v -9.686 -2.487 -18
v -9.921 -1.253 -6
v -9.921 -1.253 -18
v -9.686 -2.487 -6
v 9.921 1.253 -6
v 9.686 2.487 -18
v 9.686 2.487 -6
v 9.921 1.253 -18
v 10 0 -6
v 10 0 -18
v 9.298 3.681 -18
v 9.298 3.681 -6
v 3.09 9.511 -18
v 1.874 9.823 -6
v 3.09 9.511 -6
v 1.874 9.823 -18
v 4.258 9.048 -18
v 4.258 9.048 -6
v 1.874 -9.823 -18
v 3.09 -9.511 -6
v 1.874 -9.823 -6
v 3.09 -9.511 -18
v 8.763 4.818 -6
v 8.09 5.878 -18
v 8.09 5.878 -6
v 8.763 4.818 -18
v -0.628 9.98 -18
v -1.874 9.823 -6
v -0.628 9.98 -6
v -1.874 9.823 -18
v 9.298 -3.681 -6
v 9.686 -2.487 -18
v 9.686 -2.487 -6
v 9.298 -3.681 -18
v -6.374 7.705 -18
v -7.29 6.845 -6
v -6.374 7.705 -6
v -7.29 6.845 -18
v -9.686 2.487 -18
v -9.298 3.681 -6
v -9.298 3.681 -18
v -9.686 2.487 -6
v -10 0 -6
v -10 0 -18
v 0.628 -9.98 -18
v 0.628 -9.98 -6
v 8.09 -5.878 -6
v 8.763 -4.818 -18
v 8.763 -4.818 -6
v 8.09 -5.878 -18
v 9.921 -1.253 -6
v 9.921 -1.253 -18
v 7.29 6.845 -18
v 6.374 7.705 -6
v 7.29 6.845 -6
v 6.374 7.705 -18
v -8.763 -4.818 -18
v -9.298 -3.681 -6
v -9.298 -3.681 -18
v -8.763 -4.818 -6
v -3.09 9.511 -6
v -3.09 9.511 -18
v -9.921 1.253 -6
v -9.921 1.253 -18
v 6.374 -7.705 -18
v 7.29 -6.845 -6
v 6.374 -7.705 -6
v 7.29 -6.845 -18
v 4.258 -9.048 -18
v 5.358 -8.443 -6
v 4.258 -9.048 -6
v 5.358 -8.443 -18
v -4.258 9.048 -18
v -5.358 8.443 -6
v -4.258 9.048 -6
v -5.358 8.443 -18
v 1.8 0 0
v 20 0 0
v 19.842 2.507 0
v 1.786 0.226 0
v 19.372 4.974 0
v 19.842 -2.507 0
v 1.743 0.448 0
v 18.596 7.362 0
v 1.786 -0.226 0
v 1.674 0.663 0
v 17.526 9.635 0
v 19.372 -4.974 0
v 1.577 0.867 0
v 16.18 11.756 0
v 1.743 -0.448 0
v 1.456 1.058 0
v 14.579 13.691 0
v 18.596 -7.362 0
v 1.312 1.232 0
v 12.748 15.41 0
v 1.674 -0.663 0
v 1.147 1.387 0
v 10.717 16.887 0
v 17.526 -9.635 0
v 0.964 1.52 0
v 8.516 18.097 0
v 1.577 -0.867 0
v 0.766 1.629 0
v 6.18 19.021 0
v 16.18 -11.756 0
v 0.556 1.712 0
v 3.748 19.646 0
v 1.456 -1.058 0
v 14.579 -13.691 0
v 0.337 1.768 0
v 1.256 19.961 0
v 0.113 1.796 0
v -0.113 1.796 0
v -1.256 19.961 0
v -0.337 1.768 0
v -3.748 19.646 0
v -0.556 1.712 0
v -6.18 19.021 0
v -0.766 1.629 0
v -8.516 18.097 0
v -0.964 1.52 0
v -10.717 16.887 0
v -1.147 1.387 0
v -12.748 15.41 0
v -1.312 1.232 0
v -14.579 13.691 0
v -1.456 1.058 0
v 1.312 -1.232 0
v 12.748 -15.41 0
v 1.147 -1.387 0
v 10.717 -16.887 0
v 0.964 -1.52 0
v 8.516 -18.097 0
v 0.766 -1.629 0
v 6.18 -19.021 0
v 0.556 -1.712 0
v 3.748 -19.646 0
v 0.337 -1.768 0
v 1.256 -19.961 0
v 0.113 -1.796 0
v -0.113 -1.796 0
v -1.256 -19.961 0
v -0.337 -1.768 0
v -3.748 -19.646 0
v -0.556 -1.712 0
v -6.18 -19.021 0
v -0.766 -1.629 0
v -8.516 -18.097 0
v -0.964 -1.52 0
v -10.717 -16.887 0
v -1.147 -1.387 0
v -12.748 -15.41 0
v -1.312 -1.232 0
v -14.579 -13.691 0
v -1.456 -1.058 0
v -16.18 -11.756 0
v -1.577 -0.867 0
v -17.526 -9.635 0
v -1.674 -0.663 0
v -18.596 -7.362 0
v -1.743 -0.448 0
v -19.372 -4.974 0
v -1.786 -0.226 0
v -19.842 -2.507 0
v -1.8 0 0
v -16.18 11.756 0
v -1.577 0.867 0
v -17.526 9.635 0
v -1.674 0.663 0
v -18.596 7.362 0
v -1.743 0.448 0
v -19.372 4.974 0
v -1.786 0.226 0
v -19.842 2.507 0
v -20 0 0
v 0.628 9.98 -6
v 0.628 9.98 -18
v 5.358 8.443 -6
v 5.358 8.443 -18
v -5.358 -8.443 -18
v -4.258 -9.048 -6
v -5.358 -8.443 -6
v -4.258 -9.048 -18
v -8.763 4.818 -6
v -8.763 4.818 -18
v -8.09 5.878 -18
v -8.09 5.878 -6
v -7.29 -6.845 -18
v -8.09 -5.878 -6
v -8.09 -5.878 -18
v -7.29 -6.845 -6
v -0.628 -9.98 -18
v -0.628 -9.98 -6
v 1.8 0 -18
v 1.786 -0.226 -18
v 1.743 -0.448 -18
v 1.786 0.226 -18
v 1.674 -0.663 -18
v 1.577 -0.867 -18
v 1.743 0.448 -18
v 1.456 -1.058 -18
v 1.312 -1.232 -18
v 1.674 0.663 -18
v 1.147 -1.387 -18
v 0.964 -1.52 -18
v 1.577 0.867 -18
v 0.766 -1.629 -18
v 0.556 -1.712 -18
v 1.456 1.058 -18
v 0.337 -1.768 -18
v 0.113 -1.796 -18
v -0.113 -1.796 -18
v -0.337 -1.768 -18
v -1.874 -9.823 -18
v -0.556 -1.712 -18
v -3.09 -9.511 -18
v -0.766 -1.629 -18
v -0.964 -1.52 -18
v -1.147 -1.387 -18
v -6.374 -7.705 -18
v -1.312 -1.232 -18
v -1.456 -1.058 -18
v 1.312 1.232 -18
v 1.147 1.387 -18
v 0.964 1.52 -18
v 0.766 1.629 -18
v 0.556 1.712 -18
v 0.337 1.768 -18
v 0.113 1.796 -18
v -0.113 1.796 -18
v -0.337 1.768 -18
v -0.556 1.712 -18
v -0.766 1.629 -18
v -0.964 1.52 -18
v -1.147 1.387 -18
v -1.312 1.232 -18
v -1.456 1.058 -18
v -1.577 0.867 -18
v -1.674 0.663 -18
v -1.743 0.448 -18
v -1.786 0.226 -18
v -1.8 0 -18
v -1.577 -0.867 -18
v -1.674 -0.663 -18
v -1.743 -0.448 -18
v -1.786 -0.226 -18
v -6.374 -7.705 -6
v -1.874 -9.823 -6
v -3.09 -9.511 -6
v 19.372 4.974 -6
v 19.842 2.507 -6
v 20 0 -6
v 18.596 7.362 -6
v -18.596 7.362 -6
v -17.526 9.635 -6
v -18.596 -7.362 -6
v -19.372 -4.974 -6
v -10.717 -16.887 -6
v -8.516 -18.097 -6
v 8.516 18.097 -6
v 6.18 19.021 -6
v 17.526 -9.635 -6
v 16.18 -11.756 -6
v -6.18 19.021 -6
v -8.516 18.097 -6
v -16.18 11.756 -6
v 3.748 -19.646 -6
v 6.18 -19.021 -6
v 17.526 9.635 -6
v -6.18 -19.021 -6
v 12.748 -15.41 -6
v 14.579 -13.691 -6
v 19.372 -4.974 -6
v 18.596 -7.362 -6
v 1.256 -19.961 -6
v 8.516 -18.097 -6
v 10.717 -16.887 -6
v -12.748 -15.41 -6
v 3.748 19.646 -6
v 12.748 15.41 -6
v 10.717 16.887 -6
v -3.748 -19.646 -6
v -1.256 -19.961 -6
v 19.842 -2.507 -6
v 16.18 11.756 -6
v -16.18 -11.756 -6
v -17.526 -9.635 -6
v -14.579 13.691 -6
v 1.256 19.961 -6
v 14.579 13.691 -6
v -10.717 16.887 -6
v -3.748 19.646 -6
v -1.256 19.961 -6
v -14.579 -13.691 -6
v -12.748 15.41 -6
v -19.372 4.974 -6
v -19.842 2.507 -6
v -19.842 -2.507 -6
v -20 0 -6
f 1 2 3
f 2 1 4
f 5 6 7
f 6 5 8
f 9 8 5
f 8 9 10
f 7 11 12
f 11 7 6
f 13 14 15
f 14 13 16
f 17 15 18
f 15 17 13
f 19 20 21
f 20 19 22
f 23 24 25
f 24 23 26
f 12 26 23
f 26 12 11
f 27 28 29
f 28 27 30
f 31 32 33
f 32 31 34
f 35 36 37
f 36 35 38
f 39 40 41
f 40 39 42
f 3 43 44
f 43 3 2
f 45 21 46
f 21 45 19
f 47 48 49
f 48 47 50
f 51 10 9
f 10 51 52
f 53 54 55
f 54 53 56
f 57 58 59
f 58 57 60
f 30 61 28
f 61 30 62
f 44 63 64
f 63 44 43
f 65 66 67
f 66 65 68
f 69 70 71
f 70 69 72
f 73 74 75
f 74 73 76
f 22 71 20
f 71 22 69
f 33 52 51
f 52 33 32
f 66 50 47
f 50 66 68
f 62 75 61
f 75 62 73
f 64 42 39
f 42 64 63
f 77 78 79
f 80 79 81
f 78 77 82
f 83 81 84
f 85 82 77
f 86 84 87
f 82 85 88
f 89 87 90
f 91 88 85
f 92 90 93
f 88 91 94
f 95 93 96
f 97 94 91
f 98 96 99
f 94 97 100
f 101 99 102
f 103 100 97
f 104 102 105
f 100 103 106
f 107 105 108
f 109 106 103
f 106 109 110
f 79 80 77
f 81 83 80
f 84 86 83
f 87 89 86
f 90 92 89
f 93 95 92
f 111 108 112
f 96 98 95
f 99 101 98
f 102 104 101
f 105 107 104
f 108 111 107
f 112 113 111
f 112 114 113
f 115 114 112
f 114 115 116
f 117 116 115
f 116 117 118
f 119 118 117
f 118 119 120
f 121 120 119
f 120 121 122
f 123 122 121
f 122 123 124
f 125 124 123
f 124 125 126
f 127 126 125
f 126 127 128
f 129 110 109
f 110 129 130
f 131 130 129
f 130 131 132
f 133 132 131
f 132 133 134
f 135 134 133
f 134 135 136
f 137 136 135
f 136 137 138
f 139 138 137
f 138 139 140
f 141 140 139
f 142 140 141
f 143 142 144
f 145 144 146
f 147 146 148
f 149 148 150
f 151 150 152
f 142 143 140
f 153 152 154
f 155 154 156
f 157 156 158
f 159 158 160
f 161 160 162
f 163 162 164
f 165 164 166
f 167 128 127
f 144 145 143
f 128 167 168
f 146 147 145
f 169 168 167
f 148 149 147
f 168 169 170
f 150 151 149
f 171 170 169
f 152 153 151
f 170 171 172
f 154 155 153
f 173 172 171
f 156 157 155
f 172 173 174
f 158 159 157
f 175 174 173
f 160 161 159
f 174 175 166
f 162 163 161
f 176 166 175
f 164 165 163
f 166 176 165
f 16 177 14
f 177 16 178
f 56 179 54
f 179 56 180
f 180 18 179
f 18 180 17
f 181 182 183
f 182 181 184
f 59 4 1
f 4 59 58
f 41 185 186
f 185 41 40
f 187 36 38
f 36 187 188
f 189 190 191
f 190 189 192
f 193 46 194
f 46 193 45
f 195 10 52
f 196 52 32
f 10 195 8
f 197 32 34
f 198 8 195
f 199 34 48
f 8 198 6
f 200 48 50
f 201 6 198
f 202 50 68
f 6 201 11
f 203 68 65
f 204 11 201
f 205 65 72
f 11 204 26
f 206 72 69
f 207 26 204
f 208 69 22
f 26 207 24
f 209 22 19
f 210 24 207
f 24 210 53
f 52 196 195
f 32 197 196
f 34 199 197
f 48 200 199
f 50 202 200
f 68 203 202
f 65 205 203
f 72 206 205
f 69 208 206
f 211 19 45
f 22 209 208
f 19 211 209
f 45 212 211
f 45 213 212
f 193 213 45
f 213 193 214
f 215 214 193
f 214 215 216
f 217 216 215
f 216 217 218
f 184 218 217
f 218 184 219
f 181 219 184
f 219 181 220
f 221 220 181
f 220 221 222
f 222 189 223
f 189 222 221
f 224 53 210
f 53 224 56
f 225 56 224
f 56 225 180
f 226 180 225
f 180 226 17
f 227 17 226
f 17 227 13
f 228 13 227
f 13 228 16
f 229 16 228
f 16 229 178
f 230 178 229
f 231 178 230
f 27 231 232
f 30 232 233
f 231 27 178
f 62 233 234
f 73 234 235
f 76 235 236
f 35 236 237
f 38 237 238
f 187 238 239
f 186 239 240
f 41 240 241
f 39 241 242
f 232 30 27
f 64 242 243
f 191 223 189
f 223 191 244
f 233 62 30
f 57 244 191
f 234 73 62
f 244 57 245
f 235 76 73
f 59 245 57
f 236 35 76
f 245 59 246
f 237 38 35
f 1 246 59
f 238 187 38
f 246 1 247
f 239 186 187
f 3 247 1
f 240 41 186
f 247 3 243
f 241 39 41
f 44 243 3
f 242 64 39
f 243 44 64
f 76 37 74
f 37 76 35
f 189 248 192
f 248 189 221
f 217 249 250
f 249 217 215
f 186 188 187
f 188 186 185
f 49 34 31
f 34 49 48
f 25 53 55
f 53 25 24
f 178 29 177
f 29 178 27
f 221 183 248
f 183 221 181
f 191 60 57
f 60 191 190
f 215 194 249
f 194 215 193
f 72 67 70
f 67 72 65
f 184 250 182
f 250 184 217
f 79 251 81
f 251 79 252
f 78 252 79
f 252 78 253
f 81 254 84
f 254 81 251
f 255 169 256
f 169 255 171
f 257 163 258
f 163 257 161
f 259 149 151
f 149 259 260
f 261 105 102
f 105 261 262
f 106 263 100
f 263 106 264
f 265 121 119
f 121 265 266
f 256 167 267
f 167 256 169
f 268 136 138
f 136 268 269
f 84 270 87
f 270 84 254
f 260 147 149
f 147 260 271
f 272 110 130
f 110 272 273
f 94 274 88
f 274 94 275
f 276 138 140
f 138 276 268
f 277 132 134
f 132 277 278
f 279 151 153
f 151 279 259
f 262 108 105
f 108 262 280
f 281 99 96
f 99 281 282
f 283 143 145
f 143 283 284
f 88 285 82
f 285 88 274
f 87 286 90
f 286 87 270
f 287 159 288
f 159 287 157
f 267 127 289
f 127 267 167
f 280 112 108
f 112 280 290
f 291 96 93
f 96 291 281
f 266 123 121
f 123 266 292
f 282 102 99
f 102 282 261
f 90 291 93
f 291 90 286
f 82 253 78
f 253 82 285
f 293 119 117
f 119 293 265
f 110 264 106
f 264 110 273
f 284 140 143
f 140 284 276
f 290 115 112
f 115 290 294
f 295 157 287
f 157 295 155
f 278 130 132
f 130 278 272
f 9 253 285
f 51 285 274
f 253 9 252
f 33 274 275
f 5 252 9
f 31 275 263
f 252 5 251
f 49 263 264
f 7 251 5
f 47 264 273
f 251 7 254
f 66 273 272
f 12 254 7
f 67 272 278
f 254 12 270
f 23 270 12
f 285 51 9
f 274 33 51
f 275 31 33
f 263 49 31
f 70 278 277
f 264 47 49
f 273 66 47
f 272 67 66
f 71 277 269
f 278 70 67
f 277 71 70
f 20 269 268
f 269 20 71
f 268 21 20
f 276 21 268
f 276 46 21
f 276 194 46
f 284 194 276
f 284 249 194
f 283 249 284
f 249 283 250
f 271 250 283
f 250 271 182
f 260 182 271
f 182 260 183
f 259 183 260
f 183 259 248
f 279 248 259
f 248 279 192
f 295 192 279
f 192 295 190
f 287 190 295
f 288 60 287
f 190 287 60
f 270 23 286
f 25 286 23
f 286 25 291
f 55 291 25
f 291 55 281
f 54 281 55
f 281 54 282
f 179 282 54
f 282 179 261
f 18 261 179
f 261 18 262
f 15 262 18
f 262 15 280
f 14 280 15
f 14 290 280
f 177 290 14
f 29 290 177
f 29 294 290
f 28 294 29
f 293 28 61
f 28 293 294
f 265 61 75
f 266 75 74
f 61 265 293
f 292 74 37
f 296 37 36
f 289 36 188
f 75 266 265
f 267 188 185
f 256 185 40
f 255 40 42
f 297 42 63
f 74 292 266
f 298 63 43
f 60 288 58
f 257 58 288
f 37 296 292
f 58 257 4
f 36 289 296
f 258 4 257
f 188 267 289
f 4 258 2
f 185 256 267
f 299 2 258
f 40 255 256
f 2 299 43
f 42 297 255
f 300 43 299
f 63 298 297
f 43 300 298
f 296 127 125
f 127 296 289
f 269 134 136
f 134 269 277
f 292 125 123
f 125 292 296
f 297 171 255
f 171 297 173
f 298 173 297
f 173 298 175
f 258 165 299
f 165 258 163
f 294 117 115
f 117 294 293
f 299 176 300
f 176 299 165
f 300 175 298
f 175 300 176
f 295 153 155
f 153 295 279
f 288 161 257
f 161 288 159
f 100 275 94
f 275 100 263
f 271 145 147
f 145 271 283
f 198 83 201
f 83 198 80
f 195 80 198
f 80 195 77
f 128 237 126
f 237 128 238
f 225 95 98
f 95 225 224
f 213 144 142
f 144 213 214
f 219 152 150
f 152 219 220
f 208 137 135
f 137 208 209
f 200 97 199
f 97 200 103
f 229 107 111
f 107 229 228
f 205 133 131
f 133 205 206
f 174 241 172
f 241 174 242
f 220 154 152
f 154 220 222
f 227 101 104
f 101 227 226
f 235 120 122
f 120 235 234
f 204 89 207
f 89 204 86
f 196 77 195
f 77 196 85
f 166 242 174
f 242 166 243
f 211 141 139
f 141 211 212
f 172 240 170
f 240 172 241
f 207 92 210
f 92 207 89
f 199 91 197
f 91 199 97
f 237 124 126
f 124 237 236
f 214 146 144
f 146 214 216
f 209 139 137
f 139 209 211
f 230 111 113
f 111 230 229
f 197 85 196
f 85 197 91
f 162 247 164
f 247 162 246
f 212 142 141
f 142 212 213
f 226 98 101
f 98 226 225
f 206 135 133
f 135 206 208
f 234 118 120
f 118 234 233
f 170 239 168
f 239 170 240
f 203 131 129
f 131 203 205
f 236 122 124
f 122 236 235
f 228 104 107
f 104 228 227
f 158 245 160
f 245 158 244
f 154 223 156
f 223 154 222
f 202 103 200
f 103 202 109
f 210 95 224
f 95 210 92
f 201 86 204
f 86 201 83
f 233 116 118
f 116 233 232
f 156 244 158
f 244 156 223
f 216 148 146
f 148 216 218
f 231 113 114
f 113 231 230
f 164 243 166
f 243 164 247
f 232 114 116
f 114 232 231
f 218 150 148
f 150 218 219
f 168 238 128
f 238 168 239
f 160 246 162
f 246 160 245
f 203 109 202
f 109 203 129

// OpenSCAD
$fn = 50;


difference() {
	union() {
		translate(v = [0, 0, -18.0000000000]) {
			cylinder(h = 18, r = 10.0000000000);
		}
		translate(v = [0, 0, -6.0000000000]) {
			cylinder(h = 6, r = 20.0000000000);
		}
	}
	union() {
		#translate(v = [0, 0, -18]) {
			cylinder(h = 18, r = 1.8000000000);
		}
	}
}
